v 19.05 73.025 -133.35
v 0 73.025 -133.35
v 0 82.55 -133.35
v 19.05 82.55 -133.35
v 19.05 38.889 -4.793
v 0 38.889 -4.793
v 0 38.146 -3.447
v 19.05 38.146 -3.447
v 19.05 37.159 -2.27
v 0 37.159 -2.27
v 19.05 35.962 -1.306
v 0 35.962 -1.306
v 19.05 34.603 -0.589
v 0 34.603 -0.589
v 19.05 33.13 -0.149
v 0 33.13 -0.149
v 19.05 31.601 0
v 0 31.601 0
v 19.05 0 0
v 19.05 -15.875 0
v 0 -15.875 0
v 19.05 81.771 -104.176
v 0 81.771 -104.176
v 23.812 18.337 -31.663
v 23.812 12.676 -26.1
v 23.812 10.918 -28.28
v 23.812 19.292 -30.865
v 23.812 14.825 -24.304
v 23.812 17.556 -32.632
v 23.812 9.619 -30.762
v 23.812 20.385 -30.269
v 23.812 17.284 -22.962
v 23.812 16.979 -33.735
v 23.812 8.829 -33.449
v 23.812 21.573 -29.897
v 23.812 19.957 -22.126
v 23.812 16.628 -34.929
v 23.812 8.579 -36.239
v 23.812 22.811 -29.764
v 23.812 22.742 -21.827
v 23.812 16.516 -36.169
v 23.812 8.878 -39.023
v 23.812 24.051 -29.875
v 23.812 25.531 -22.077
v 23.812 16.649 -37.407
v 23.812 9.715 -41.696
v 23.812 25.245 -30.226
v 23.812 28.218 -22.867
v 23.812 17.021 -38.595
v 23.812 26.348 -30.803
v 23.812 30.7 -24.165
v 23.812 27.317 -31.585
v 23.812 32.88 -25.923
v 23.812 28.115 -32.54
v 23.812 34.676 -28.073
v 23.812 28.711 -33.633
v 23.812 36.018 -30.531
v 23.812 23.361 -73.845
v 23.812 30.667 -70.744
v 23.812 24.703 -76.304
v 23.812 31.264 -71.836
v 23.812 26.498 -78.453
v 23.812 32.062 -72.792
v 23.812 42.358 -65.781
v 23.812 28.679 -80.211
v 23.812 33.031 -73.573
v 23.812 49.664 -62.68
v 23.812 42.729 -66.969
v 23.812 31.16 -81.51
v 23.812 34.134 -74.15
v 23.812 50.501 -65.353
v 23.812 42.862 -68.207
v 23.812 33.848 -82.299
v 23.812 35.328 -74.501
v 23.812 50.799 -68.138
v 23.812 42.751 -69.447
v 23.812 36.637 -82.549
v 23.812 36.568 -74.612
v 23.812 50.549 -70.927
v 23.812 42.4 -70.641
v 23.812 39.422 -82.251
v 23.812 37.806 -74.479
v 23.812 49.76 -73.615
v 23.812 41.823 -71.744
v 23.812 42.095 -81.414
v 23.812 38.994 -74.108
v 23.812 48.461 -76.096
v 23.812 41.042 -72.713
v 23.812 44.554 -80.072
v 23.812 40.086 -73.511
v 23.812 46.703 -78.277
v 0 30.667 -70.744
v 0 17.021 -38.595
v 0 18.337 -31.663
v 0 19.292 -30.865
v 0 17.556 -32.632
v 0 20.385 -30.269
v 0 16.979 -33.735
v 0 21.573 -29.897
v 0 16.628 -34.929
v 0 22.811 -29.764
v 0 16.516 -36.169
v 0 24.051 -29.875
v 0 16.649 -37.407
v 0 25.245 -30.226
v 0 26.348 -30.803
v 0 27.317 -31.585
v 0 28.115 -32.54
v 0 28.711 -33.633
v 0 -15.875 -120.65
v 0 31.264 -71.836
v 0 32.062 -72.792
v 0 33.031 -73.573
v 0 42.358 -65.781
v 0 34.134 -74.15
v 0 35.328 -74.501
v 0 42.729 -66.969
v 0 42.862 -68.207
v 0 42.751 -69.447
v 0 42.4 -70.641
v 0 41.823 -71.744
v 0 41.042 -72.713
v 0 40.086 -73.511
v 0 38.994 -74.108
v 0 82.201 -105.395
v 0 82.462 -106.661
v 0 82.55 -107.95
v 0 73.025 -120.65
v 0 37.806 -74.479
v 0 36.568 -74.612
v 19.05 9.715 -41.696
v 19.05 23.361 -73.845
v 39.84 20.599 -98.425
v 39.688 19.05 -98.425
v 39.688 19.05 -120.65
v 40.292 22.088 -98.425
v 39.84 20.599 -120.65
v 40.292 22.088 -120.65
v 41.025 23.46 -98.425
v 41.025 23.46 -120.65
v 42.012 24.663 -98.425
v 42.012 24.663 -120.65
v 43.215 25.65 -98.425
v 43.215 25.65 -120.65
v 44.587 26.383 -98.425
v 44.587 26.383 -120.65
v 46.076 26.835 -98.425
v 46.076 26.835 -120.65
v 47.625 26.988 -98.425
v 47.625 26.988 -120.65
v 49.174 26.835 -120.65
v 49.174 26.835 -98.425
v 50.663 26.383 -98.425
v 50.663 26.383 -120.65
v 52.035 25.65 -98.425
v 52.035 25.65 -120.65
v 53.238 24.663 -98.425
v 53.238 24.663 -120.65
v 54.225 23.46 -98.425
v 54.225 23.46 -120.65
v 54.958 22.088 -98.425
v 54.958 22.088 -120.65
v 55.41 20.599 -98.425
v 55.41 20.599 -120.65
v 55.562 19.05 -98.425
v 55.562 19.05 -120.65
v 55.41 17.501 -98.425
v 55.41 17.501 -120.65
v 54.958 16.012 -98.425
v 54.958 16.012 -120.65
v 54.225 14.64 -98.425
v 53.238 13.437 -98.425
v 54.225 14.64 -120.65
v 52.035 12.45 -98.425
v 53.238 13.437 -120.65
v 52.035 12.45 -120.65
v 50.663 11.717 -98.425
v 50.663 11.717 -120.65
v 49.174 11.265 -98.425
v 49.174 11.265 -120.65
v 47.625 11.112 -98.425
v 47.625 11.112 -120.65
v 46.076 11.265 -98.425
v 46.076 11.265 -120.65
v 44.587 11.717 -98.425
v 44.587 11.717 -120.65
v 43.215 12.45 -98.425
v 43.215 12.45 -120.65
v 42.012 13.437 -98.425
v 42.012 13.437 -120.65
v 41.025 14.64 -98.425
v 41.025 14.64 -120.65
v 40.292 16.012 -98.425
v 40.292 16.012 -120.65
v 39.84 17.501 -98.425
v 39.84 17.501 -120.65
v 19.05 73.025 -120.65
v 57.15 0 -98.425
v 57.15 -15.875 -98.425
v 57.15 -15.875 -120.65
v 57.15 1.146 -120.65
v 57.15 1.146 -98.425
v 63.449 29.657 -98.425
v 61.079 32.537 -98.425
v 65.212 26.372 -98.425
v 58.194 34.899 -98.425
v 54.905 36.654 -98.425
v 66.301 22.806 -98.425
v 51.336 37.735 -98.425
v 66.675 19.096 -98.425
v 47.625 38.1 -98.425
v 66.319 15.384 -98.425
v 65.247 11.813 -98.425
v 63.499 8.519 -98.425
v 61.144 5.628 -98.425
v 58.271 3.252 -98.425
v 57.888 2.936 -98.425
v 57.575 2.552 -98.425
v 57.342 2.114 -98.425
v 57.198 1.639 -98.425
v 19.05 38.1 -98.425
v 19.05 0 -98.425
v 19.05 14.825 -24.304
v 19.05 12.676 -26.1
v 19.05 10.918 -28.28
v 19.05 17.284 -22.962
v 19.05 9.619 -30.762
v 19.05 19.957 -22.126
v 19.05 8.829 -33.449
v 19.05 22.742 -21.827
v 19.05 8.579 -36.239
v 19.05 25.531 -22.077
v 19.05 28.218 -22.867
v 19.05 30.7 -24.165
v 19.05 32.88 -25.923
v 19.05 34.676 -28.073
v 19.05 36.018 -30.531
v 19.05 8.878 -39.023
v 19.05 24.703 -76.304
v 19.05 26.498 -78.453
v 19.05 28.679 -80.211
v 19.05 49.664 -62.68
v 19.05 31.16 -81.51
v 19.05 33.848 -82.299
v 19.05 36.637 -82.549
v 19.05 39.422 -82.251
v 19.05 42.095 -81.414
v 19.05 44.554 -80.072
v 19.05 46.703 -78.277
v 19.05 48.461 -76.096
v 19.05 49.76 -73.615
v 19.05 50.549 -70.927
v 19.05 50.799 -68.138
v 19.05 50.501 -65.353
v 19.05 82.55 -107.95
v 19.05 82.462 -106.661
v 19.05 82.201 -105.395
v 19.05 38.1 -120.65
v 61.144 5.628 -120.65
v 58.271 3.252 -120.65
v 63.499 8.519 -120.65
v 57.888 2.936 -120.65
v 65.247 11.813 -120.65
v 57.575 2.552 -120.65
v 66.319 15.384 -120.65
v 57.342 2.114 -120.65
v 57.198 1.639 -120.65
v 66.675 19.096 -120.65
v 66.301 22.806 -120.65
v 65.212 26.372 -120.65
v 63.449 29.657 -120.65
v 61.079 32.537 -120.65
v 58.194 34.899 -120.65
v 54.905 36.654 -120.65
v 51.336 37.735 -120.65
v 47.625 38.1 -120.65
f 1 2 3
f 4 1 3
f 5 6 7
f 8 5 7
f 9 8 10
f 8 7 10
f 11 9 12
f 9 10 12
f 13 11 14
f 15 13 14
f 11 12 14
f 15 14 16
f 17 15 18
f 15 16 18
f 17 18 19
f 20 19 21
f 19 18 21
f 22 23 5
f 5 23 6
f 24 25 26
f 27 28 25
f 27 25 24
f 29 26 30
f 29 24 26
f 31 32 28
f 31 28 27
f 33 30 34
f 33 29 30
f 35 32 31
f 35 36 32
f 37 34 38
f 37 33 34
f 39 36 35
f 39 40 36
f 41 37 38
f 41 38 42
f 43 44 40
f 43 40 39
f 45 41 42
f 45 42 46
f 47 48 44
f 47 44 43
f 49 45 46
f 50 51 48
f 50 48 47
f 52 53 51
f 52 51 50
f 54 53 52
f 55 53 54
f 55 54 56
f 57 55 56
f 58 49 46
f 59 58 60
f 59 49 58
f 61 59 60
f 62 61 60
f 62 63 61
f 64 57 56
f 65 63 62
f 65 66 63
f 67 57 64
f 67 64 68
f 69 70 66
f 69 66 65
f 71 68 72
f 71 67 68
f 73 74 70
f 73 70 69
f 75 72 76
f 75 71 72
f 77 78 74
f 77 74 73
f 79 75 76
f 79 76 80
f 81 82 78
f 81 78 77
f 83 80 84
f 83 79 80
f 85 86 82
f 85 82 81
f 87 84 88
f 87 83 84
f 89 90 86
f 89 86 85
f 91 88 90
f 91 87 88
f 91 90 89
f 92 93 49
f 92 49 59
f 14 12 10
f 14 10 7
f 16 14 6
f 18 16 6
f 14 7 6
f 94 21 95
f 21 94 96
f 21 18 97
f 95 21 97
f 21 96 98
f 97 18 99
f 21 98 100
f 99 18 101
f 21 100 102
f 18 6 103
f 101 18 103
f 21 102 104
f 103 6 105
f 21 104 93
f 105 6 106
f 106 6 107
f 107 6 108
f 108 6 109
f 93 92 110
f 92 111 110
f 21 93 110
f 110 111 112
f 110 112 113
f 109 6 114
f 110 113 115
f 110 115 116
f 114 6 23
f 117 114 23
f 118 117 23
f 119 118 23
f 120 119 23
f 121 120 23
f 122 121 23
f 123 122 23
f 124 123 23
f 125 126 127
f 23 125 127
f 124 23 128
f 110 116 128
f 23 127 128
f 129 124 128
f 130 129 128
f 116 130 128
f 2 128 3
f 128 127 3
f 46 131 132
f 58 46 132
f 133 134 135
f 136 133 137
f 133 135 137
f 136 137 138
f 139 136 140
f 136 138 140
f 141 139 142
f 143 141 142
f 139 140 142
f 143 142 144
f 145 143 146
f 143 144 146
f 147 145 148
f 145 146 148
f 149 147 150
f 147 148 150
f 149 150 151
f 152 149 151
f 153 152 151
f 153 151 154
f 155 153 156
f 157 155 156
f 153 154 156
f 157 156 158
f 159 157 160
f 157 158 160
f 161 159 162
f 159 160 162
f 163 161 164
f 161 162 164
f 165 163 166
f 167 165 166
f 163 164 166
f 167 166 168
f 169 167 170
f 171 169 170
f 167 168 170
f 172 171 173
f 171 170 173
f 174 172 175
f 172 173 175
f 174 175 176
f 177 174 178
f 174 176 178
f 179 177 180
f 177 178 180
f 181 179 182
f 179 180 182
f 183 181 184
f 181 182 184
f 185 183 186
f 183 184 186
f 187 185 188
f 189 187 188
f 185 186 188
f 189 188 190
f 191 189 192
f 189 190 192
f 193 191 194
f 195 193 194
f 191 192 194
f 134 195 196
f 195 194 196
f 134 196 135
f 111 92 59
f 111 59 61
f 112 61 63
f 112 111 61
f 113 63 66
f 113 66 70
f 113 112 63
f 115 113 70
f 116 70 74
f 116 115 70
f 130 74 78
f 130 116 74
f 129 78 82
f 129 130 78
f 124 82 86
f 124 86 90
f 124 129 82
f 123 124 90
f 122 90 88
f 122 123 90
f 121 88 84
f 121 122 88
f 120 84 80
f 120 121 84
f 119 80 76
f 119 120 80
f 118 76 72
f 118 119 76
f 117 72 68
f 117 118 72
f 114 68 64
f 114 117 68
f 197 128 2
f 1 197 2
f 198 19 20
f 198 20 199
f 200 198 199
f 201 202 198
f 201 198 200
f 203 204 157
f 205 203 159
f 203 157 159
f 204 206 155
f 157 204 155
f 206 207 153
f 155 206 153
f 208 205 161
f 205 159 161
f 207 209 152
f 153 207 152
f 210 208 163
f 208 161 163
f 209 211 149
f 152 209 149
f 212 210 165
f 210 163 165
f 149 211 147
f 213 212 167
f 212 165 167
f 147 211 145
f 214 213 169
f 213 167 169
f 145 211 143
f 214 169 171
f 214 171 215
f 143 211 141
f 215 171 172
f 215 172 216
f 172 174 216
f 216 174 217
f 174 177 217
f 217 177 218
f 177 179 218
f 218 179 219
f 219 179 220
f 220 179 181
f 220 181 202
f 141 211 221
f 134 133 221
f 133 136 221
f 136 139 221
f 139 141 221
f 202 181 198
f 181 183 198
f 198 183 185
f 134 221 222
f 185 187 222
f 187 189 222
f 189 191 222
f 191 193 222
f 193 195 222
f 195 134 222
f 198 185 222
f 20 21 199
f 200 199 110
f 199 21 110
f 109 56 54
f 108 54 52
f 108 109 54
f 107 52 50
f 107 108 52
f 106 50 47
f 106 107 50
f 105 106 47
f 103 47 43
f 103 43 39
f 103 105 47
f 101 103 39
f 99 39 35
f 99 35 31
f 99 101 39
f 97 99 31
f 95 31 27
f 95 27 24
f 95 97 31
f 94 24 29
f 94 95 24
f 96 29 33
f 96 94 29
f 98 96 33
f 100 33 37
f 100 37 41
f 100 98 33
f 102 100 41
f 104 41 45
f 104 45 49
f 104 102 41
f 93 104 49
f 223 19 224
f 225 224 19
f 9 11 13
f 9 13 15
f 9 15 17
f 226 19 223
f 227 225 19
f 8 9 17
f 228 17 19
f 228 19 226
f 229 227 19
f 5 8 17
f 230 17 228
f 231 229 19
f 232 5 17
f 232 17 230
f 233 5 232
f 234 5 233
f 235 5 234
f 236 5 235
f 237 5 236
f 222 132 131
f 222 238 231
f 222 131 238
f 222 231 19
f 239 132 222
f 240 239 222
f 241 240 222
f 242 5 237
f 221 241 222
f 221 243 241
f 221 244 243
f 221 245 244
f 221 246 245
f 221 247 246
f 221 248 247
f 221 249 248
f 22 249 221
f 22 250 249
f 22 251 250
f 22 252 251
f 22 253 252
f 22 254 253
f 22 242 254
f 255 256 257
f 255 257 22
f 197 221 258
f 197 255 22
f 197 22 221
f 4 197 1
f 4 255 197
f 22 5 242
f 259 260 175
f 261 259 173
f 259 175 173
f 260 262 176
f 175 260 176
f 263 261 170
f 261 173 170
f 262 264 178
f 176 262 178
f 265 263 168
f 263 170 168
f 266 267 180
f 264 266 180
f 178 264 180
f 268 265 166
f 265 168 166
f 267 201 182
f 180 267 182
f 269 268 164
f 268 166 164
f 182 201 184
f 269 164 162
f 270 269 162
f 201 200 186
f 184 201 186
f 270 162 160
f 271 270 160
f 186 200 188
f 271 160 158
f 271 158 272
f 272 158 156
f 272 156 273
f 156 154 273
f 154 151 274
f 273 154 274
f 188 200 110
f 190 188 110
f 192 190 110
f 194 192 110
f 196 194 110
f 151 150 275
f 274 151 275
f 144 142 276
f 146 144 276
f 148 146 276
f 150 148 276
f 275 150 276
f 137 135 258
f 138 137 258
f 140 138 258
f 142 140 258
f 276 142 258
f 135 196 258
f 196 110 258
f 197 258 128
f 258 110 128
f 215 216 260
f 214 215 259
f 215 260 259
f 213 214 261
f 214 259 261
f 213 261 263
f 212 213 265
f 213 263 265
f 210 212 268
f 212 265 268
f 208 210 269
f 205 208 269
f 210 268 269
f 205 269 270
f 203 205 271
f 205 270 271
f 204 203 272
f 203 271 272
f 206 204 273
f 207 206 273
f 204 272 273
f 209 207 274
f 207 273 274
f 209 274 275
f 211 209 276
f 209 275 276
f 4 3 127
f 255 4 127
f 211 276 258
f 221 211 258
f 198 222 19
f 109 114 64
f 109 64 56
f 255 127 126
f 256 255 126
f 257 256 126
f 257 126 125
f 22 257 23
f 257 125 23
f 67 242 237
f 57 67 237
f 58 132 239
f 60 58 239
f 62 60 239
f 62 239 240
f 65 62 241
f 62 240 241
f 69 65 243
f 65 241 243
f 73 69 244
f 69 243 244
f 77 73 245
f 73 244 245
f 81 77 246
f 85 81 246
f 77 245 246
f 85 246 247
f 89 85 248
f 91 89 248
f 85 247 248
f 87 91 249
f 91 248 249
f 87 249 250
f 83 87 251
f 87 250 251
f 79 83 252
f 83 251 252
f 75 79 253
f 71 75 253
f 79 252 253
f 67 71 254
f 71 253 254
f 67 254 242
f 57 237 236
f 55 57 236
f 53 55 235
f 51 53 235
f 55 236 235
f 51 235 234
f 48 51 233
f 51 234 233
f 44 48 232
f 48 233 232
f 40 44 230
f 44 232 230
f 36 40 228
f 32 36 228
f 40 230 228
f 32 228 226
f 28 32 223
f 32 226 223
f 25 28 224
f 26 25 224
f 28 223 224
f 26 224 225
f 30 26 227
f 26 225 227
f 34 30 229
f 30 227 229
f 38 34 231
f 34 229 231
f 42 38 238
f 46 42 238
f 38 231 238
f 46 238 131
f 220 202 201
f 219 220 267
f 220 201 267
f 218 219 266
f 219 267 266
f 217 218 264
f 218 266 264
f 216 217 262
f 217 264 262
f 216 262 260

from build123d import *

# Parameters (mm, degrees)
BOSS_EXTRUDE1_DEPTH = 19.05
BOSS_EXTRUDE2_START = 19.05
BOSS_EXTRUDE2_DEPTH = 4.7625
BOSS_EXTRUDE3_START = 19.05
BOSS_EXTRUDE3_DEPTH = 38.1
CUT_EXTRUDE1_DEPTH  = 16.875
SKETCH3_R           = 7.9375
BOSS_EXTRUDE5_DEPTH = 22.225
FILLET1_R           = 2.54


with BuildPart() as part:
    # Sketch1 → Boss-Extrude1 (new body)
    with BuildSketch(Plane(origin=(0, 0, 0), x_dir=(0, 0, -1), z_dir=(1, 0, 0))):
        with BuildLine():
            Line((0, 31.600913244), (0, 0))
            Line((0, 0), (98.425, 0))
            Line((98.425, 0), (98.425, 6.35))
            Line((98.425, 6.35), (120.65, 6.35))
            Line((120.65, 6.35), (120.65, 73.025))
            Line((120.65, 73.025), (133.35, 73.025))
            Line((133.35, 73.025), (133.35, 82.55))
            Line((133.35, 82.55), (107.95, 82.55))
            ThreePointArc((107.95, 82.55), (106.023410696, 82.353122997), (104.176464673, 81.770630688))
            Line((104.176464673, 81.770630688), (4.792887228, 38.888938818))
            ThreePointArc((4.792887228, 38.888938818), (1.305597176, 35.962308799), (0, 31.600913244))
        make_face()
        with BuildLine():
            ThreePointArc((41.696438991, 9.714502244), (22.962154899, 17.283644339), (30.531296995, 36.017928431))
            Line((30.531296995, 36.017928431), (62.679929002, 49.664213094))
            ThreePointArc((62.679929002, 49.664213094), (81.414213094, 42.095070998), (73.845070998, 23.360786906))
            Line((73.845070998, 23.360786906), (41.696438991, 9.714502244))
        make_face(mode=Mode.SUBTRACT)
        Polygon((98.425, 0), (0, 0), (0, -15.875), (120.65, -15.875), (120.65, 0), (120.65, 6.35), (98.425, 6.35), align=None)
        with BuildLine():
            Line((62.679929002, 49.664213094), (30.531296995, 36.017928431))
            ThreePointArc((30.531296995, 36.017928431), (22.962154899, 17.283644339), (41.696438991, 9.714502244))
            Line((41.696438991, 9.714502244), (73.845070998, 23.360786906))
            ThreePointArc((73.845070998, 23.360786906), (81.414213094, 42.095070998), (62.679929002, 49.664213094))
        make_face()
        with BuildLine():
            ThreePointArc((38.595010659, 17.021009518), (30.268662174, 20.385072672), (33.632725327, 28.711421157))
            Line((33.632725327, 28.711421157), (65.781357334, 42.357705819))
            ThreePointArc((65.781357334, 42.357705819), (74.107705819, 38.993642666), (70.743642666, 30.667294181))
            Line((70.743642666, 30.667294181), (38.595010659, 17.021009518))
        make_face(mode=Mode.SUBTRACT)
    extrude(amount=BOSS_EXTRUDE1_DEPTH)

    # Sketch1<3> → Boss-Extrude2 (add)
    with BuildSketch(Plane(origin=(0, 0, 0), x_dir=(0, 0, -1), z_dir=(1, 0, 0)).offset(BOSS_EXTRUDE2_START)):
        with BuildLine():
            Line((41.696438991, 9.714502244), (73.845070998, 23.360786906))
            ThreePointArc((73.845070998, 23.360786906), (81.414213094, 42.095070998), (62.679929002, 49.664213094))
            Line((62.679929002, 49.664213094), (30.531296995, 36.017928431))
            ThreePointArc((30.531296995, 36.017928431), (22.962154899, 17.283644339), (41.696438991, 9.714502244))
        make_face()
        with BuildLine():
            ThreePointArc((33.632725327, 28.711421157), (30.268662174, 20.385072672), (38.595010659, 17.021009518))
            Line((38.595010659, 17.021009518), (70.743642666, 30.667294181))
            ThreePointArc((70.743642666, 30.667294181), (74.107705819, 38.993642666), (65.781357334, 42.357705819))
            Line((65.781357334, 42.357705819), (33.632725327, 28.711421157))
        make_face(mode=Mode.SUBTRACT)
    extrude(amount=BOSS_EXTRUDE2_DEPTH)

    # Sketch1<4> → Boss-Extrude3 (add)
    with BuildSketch(Plane(origin=(0, 0, 0), x_dir=(0, 0, -1), z_dir=(1, 0, 0)).offset(BOSS_EXTRUDE3_START)):
        Polygon((98.425, 0), (0, 0), (0, -15.875), (120.65, -15.875), (120.65, 0), (120.65, 6.35), (98.425, 6.35), align=None)
    extrude(amount=BOSS_EXTRUDE3_DEPTH)

    # Sketch2 → Cut-Extrude1 (cut, through all)
    with BuildSketch(Plane(origin=(0, 0, 0), x_dir=(1, 0, 0), z_dir=(0, 1, 0))):
        Polygon((19.05, 0), (57.15, 98.425), (57.15, 0), align=None)
    extrude(amount=-CUT_EXTRUDE1_DEPTH, mode=Mode.SUBTRACT)

    # Sketch3 → Boss-Extrude5 (add)
    with BuildSketch(Plane(origin=(0, 0, -120.65), x_dir=(-1, 0, 0), z_dir=(0, 0, -1))):
        with BuildLine():
            Line((-19.05, 0), (-47.625, 0))
            ThreePointArc((-47.625, 0), (-66.675, 19.05), (-47.625, 38.1))
            Line((-47.625, 38.1), (-19.05, 38.1))
            Line((-19.05, 38.1), (-19.05, 0))
        make_face()
        with Locations((-47.625, 19.05)):
            Circle(SKETCH3_R, mode=Mode.SUBTRACT)
    extrude(amount=-BOSS_EXTRUDE5_DEPTH)

    # Fillet1
    fillet1_edges = [part.edges().sort_by_distance(p)[0] for p in [
        (57.15, 2.552216058, -109.5375),
    ]]
    fillet(fillet1_edges, radius=FILLET1_R)


solid = part.part
